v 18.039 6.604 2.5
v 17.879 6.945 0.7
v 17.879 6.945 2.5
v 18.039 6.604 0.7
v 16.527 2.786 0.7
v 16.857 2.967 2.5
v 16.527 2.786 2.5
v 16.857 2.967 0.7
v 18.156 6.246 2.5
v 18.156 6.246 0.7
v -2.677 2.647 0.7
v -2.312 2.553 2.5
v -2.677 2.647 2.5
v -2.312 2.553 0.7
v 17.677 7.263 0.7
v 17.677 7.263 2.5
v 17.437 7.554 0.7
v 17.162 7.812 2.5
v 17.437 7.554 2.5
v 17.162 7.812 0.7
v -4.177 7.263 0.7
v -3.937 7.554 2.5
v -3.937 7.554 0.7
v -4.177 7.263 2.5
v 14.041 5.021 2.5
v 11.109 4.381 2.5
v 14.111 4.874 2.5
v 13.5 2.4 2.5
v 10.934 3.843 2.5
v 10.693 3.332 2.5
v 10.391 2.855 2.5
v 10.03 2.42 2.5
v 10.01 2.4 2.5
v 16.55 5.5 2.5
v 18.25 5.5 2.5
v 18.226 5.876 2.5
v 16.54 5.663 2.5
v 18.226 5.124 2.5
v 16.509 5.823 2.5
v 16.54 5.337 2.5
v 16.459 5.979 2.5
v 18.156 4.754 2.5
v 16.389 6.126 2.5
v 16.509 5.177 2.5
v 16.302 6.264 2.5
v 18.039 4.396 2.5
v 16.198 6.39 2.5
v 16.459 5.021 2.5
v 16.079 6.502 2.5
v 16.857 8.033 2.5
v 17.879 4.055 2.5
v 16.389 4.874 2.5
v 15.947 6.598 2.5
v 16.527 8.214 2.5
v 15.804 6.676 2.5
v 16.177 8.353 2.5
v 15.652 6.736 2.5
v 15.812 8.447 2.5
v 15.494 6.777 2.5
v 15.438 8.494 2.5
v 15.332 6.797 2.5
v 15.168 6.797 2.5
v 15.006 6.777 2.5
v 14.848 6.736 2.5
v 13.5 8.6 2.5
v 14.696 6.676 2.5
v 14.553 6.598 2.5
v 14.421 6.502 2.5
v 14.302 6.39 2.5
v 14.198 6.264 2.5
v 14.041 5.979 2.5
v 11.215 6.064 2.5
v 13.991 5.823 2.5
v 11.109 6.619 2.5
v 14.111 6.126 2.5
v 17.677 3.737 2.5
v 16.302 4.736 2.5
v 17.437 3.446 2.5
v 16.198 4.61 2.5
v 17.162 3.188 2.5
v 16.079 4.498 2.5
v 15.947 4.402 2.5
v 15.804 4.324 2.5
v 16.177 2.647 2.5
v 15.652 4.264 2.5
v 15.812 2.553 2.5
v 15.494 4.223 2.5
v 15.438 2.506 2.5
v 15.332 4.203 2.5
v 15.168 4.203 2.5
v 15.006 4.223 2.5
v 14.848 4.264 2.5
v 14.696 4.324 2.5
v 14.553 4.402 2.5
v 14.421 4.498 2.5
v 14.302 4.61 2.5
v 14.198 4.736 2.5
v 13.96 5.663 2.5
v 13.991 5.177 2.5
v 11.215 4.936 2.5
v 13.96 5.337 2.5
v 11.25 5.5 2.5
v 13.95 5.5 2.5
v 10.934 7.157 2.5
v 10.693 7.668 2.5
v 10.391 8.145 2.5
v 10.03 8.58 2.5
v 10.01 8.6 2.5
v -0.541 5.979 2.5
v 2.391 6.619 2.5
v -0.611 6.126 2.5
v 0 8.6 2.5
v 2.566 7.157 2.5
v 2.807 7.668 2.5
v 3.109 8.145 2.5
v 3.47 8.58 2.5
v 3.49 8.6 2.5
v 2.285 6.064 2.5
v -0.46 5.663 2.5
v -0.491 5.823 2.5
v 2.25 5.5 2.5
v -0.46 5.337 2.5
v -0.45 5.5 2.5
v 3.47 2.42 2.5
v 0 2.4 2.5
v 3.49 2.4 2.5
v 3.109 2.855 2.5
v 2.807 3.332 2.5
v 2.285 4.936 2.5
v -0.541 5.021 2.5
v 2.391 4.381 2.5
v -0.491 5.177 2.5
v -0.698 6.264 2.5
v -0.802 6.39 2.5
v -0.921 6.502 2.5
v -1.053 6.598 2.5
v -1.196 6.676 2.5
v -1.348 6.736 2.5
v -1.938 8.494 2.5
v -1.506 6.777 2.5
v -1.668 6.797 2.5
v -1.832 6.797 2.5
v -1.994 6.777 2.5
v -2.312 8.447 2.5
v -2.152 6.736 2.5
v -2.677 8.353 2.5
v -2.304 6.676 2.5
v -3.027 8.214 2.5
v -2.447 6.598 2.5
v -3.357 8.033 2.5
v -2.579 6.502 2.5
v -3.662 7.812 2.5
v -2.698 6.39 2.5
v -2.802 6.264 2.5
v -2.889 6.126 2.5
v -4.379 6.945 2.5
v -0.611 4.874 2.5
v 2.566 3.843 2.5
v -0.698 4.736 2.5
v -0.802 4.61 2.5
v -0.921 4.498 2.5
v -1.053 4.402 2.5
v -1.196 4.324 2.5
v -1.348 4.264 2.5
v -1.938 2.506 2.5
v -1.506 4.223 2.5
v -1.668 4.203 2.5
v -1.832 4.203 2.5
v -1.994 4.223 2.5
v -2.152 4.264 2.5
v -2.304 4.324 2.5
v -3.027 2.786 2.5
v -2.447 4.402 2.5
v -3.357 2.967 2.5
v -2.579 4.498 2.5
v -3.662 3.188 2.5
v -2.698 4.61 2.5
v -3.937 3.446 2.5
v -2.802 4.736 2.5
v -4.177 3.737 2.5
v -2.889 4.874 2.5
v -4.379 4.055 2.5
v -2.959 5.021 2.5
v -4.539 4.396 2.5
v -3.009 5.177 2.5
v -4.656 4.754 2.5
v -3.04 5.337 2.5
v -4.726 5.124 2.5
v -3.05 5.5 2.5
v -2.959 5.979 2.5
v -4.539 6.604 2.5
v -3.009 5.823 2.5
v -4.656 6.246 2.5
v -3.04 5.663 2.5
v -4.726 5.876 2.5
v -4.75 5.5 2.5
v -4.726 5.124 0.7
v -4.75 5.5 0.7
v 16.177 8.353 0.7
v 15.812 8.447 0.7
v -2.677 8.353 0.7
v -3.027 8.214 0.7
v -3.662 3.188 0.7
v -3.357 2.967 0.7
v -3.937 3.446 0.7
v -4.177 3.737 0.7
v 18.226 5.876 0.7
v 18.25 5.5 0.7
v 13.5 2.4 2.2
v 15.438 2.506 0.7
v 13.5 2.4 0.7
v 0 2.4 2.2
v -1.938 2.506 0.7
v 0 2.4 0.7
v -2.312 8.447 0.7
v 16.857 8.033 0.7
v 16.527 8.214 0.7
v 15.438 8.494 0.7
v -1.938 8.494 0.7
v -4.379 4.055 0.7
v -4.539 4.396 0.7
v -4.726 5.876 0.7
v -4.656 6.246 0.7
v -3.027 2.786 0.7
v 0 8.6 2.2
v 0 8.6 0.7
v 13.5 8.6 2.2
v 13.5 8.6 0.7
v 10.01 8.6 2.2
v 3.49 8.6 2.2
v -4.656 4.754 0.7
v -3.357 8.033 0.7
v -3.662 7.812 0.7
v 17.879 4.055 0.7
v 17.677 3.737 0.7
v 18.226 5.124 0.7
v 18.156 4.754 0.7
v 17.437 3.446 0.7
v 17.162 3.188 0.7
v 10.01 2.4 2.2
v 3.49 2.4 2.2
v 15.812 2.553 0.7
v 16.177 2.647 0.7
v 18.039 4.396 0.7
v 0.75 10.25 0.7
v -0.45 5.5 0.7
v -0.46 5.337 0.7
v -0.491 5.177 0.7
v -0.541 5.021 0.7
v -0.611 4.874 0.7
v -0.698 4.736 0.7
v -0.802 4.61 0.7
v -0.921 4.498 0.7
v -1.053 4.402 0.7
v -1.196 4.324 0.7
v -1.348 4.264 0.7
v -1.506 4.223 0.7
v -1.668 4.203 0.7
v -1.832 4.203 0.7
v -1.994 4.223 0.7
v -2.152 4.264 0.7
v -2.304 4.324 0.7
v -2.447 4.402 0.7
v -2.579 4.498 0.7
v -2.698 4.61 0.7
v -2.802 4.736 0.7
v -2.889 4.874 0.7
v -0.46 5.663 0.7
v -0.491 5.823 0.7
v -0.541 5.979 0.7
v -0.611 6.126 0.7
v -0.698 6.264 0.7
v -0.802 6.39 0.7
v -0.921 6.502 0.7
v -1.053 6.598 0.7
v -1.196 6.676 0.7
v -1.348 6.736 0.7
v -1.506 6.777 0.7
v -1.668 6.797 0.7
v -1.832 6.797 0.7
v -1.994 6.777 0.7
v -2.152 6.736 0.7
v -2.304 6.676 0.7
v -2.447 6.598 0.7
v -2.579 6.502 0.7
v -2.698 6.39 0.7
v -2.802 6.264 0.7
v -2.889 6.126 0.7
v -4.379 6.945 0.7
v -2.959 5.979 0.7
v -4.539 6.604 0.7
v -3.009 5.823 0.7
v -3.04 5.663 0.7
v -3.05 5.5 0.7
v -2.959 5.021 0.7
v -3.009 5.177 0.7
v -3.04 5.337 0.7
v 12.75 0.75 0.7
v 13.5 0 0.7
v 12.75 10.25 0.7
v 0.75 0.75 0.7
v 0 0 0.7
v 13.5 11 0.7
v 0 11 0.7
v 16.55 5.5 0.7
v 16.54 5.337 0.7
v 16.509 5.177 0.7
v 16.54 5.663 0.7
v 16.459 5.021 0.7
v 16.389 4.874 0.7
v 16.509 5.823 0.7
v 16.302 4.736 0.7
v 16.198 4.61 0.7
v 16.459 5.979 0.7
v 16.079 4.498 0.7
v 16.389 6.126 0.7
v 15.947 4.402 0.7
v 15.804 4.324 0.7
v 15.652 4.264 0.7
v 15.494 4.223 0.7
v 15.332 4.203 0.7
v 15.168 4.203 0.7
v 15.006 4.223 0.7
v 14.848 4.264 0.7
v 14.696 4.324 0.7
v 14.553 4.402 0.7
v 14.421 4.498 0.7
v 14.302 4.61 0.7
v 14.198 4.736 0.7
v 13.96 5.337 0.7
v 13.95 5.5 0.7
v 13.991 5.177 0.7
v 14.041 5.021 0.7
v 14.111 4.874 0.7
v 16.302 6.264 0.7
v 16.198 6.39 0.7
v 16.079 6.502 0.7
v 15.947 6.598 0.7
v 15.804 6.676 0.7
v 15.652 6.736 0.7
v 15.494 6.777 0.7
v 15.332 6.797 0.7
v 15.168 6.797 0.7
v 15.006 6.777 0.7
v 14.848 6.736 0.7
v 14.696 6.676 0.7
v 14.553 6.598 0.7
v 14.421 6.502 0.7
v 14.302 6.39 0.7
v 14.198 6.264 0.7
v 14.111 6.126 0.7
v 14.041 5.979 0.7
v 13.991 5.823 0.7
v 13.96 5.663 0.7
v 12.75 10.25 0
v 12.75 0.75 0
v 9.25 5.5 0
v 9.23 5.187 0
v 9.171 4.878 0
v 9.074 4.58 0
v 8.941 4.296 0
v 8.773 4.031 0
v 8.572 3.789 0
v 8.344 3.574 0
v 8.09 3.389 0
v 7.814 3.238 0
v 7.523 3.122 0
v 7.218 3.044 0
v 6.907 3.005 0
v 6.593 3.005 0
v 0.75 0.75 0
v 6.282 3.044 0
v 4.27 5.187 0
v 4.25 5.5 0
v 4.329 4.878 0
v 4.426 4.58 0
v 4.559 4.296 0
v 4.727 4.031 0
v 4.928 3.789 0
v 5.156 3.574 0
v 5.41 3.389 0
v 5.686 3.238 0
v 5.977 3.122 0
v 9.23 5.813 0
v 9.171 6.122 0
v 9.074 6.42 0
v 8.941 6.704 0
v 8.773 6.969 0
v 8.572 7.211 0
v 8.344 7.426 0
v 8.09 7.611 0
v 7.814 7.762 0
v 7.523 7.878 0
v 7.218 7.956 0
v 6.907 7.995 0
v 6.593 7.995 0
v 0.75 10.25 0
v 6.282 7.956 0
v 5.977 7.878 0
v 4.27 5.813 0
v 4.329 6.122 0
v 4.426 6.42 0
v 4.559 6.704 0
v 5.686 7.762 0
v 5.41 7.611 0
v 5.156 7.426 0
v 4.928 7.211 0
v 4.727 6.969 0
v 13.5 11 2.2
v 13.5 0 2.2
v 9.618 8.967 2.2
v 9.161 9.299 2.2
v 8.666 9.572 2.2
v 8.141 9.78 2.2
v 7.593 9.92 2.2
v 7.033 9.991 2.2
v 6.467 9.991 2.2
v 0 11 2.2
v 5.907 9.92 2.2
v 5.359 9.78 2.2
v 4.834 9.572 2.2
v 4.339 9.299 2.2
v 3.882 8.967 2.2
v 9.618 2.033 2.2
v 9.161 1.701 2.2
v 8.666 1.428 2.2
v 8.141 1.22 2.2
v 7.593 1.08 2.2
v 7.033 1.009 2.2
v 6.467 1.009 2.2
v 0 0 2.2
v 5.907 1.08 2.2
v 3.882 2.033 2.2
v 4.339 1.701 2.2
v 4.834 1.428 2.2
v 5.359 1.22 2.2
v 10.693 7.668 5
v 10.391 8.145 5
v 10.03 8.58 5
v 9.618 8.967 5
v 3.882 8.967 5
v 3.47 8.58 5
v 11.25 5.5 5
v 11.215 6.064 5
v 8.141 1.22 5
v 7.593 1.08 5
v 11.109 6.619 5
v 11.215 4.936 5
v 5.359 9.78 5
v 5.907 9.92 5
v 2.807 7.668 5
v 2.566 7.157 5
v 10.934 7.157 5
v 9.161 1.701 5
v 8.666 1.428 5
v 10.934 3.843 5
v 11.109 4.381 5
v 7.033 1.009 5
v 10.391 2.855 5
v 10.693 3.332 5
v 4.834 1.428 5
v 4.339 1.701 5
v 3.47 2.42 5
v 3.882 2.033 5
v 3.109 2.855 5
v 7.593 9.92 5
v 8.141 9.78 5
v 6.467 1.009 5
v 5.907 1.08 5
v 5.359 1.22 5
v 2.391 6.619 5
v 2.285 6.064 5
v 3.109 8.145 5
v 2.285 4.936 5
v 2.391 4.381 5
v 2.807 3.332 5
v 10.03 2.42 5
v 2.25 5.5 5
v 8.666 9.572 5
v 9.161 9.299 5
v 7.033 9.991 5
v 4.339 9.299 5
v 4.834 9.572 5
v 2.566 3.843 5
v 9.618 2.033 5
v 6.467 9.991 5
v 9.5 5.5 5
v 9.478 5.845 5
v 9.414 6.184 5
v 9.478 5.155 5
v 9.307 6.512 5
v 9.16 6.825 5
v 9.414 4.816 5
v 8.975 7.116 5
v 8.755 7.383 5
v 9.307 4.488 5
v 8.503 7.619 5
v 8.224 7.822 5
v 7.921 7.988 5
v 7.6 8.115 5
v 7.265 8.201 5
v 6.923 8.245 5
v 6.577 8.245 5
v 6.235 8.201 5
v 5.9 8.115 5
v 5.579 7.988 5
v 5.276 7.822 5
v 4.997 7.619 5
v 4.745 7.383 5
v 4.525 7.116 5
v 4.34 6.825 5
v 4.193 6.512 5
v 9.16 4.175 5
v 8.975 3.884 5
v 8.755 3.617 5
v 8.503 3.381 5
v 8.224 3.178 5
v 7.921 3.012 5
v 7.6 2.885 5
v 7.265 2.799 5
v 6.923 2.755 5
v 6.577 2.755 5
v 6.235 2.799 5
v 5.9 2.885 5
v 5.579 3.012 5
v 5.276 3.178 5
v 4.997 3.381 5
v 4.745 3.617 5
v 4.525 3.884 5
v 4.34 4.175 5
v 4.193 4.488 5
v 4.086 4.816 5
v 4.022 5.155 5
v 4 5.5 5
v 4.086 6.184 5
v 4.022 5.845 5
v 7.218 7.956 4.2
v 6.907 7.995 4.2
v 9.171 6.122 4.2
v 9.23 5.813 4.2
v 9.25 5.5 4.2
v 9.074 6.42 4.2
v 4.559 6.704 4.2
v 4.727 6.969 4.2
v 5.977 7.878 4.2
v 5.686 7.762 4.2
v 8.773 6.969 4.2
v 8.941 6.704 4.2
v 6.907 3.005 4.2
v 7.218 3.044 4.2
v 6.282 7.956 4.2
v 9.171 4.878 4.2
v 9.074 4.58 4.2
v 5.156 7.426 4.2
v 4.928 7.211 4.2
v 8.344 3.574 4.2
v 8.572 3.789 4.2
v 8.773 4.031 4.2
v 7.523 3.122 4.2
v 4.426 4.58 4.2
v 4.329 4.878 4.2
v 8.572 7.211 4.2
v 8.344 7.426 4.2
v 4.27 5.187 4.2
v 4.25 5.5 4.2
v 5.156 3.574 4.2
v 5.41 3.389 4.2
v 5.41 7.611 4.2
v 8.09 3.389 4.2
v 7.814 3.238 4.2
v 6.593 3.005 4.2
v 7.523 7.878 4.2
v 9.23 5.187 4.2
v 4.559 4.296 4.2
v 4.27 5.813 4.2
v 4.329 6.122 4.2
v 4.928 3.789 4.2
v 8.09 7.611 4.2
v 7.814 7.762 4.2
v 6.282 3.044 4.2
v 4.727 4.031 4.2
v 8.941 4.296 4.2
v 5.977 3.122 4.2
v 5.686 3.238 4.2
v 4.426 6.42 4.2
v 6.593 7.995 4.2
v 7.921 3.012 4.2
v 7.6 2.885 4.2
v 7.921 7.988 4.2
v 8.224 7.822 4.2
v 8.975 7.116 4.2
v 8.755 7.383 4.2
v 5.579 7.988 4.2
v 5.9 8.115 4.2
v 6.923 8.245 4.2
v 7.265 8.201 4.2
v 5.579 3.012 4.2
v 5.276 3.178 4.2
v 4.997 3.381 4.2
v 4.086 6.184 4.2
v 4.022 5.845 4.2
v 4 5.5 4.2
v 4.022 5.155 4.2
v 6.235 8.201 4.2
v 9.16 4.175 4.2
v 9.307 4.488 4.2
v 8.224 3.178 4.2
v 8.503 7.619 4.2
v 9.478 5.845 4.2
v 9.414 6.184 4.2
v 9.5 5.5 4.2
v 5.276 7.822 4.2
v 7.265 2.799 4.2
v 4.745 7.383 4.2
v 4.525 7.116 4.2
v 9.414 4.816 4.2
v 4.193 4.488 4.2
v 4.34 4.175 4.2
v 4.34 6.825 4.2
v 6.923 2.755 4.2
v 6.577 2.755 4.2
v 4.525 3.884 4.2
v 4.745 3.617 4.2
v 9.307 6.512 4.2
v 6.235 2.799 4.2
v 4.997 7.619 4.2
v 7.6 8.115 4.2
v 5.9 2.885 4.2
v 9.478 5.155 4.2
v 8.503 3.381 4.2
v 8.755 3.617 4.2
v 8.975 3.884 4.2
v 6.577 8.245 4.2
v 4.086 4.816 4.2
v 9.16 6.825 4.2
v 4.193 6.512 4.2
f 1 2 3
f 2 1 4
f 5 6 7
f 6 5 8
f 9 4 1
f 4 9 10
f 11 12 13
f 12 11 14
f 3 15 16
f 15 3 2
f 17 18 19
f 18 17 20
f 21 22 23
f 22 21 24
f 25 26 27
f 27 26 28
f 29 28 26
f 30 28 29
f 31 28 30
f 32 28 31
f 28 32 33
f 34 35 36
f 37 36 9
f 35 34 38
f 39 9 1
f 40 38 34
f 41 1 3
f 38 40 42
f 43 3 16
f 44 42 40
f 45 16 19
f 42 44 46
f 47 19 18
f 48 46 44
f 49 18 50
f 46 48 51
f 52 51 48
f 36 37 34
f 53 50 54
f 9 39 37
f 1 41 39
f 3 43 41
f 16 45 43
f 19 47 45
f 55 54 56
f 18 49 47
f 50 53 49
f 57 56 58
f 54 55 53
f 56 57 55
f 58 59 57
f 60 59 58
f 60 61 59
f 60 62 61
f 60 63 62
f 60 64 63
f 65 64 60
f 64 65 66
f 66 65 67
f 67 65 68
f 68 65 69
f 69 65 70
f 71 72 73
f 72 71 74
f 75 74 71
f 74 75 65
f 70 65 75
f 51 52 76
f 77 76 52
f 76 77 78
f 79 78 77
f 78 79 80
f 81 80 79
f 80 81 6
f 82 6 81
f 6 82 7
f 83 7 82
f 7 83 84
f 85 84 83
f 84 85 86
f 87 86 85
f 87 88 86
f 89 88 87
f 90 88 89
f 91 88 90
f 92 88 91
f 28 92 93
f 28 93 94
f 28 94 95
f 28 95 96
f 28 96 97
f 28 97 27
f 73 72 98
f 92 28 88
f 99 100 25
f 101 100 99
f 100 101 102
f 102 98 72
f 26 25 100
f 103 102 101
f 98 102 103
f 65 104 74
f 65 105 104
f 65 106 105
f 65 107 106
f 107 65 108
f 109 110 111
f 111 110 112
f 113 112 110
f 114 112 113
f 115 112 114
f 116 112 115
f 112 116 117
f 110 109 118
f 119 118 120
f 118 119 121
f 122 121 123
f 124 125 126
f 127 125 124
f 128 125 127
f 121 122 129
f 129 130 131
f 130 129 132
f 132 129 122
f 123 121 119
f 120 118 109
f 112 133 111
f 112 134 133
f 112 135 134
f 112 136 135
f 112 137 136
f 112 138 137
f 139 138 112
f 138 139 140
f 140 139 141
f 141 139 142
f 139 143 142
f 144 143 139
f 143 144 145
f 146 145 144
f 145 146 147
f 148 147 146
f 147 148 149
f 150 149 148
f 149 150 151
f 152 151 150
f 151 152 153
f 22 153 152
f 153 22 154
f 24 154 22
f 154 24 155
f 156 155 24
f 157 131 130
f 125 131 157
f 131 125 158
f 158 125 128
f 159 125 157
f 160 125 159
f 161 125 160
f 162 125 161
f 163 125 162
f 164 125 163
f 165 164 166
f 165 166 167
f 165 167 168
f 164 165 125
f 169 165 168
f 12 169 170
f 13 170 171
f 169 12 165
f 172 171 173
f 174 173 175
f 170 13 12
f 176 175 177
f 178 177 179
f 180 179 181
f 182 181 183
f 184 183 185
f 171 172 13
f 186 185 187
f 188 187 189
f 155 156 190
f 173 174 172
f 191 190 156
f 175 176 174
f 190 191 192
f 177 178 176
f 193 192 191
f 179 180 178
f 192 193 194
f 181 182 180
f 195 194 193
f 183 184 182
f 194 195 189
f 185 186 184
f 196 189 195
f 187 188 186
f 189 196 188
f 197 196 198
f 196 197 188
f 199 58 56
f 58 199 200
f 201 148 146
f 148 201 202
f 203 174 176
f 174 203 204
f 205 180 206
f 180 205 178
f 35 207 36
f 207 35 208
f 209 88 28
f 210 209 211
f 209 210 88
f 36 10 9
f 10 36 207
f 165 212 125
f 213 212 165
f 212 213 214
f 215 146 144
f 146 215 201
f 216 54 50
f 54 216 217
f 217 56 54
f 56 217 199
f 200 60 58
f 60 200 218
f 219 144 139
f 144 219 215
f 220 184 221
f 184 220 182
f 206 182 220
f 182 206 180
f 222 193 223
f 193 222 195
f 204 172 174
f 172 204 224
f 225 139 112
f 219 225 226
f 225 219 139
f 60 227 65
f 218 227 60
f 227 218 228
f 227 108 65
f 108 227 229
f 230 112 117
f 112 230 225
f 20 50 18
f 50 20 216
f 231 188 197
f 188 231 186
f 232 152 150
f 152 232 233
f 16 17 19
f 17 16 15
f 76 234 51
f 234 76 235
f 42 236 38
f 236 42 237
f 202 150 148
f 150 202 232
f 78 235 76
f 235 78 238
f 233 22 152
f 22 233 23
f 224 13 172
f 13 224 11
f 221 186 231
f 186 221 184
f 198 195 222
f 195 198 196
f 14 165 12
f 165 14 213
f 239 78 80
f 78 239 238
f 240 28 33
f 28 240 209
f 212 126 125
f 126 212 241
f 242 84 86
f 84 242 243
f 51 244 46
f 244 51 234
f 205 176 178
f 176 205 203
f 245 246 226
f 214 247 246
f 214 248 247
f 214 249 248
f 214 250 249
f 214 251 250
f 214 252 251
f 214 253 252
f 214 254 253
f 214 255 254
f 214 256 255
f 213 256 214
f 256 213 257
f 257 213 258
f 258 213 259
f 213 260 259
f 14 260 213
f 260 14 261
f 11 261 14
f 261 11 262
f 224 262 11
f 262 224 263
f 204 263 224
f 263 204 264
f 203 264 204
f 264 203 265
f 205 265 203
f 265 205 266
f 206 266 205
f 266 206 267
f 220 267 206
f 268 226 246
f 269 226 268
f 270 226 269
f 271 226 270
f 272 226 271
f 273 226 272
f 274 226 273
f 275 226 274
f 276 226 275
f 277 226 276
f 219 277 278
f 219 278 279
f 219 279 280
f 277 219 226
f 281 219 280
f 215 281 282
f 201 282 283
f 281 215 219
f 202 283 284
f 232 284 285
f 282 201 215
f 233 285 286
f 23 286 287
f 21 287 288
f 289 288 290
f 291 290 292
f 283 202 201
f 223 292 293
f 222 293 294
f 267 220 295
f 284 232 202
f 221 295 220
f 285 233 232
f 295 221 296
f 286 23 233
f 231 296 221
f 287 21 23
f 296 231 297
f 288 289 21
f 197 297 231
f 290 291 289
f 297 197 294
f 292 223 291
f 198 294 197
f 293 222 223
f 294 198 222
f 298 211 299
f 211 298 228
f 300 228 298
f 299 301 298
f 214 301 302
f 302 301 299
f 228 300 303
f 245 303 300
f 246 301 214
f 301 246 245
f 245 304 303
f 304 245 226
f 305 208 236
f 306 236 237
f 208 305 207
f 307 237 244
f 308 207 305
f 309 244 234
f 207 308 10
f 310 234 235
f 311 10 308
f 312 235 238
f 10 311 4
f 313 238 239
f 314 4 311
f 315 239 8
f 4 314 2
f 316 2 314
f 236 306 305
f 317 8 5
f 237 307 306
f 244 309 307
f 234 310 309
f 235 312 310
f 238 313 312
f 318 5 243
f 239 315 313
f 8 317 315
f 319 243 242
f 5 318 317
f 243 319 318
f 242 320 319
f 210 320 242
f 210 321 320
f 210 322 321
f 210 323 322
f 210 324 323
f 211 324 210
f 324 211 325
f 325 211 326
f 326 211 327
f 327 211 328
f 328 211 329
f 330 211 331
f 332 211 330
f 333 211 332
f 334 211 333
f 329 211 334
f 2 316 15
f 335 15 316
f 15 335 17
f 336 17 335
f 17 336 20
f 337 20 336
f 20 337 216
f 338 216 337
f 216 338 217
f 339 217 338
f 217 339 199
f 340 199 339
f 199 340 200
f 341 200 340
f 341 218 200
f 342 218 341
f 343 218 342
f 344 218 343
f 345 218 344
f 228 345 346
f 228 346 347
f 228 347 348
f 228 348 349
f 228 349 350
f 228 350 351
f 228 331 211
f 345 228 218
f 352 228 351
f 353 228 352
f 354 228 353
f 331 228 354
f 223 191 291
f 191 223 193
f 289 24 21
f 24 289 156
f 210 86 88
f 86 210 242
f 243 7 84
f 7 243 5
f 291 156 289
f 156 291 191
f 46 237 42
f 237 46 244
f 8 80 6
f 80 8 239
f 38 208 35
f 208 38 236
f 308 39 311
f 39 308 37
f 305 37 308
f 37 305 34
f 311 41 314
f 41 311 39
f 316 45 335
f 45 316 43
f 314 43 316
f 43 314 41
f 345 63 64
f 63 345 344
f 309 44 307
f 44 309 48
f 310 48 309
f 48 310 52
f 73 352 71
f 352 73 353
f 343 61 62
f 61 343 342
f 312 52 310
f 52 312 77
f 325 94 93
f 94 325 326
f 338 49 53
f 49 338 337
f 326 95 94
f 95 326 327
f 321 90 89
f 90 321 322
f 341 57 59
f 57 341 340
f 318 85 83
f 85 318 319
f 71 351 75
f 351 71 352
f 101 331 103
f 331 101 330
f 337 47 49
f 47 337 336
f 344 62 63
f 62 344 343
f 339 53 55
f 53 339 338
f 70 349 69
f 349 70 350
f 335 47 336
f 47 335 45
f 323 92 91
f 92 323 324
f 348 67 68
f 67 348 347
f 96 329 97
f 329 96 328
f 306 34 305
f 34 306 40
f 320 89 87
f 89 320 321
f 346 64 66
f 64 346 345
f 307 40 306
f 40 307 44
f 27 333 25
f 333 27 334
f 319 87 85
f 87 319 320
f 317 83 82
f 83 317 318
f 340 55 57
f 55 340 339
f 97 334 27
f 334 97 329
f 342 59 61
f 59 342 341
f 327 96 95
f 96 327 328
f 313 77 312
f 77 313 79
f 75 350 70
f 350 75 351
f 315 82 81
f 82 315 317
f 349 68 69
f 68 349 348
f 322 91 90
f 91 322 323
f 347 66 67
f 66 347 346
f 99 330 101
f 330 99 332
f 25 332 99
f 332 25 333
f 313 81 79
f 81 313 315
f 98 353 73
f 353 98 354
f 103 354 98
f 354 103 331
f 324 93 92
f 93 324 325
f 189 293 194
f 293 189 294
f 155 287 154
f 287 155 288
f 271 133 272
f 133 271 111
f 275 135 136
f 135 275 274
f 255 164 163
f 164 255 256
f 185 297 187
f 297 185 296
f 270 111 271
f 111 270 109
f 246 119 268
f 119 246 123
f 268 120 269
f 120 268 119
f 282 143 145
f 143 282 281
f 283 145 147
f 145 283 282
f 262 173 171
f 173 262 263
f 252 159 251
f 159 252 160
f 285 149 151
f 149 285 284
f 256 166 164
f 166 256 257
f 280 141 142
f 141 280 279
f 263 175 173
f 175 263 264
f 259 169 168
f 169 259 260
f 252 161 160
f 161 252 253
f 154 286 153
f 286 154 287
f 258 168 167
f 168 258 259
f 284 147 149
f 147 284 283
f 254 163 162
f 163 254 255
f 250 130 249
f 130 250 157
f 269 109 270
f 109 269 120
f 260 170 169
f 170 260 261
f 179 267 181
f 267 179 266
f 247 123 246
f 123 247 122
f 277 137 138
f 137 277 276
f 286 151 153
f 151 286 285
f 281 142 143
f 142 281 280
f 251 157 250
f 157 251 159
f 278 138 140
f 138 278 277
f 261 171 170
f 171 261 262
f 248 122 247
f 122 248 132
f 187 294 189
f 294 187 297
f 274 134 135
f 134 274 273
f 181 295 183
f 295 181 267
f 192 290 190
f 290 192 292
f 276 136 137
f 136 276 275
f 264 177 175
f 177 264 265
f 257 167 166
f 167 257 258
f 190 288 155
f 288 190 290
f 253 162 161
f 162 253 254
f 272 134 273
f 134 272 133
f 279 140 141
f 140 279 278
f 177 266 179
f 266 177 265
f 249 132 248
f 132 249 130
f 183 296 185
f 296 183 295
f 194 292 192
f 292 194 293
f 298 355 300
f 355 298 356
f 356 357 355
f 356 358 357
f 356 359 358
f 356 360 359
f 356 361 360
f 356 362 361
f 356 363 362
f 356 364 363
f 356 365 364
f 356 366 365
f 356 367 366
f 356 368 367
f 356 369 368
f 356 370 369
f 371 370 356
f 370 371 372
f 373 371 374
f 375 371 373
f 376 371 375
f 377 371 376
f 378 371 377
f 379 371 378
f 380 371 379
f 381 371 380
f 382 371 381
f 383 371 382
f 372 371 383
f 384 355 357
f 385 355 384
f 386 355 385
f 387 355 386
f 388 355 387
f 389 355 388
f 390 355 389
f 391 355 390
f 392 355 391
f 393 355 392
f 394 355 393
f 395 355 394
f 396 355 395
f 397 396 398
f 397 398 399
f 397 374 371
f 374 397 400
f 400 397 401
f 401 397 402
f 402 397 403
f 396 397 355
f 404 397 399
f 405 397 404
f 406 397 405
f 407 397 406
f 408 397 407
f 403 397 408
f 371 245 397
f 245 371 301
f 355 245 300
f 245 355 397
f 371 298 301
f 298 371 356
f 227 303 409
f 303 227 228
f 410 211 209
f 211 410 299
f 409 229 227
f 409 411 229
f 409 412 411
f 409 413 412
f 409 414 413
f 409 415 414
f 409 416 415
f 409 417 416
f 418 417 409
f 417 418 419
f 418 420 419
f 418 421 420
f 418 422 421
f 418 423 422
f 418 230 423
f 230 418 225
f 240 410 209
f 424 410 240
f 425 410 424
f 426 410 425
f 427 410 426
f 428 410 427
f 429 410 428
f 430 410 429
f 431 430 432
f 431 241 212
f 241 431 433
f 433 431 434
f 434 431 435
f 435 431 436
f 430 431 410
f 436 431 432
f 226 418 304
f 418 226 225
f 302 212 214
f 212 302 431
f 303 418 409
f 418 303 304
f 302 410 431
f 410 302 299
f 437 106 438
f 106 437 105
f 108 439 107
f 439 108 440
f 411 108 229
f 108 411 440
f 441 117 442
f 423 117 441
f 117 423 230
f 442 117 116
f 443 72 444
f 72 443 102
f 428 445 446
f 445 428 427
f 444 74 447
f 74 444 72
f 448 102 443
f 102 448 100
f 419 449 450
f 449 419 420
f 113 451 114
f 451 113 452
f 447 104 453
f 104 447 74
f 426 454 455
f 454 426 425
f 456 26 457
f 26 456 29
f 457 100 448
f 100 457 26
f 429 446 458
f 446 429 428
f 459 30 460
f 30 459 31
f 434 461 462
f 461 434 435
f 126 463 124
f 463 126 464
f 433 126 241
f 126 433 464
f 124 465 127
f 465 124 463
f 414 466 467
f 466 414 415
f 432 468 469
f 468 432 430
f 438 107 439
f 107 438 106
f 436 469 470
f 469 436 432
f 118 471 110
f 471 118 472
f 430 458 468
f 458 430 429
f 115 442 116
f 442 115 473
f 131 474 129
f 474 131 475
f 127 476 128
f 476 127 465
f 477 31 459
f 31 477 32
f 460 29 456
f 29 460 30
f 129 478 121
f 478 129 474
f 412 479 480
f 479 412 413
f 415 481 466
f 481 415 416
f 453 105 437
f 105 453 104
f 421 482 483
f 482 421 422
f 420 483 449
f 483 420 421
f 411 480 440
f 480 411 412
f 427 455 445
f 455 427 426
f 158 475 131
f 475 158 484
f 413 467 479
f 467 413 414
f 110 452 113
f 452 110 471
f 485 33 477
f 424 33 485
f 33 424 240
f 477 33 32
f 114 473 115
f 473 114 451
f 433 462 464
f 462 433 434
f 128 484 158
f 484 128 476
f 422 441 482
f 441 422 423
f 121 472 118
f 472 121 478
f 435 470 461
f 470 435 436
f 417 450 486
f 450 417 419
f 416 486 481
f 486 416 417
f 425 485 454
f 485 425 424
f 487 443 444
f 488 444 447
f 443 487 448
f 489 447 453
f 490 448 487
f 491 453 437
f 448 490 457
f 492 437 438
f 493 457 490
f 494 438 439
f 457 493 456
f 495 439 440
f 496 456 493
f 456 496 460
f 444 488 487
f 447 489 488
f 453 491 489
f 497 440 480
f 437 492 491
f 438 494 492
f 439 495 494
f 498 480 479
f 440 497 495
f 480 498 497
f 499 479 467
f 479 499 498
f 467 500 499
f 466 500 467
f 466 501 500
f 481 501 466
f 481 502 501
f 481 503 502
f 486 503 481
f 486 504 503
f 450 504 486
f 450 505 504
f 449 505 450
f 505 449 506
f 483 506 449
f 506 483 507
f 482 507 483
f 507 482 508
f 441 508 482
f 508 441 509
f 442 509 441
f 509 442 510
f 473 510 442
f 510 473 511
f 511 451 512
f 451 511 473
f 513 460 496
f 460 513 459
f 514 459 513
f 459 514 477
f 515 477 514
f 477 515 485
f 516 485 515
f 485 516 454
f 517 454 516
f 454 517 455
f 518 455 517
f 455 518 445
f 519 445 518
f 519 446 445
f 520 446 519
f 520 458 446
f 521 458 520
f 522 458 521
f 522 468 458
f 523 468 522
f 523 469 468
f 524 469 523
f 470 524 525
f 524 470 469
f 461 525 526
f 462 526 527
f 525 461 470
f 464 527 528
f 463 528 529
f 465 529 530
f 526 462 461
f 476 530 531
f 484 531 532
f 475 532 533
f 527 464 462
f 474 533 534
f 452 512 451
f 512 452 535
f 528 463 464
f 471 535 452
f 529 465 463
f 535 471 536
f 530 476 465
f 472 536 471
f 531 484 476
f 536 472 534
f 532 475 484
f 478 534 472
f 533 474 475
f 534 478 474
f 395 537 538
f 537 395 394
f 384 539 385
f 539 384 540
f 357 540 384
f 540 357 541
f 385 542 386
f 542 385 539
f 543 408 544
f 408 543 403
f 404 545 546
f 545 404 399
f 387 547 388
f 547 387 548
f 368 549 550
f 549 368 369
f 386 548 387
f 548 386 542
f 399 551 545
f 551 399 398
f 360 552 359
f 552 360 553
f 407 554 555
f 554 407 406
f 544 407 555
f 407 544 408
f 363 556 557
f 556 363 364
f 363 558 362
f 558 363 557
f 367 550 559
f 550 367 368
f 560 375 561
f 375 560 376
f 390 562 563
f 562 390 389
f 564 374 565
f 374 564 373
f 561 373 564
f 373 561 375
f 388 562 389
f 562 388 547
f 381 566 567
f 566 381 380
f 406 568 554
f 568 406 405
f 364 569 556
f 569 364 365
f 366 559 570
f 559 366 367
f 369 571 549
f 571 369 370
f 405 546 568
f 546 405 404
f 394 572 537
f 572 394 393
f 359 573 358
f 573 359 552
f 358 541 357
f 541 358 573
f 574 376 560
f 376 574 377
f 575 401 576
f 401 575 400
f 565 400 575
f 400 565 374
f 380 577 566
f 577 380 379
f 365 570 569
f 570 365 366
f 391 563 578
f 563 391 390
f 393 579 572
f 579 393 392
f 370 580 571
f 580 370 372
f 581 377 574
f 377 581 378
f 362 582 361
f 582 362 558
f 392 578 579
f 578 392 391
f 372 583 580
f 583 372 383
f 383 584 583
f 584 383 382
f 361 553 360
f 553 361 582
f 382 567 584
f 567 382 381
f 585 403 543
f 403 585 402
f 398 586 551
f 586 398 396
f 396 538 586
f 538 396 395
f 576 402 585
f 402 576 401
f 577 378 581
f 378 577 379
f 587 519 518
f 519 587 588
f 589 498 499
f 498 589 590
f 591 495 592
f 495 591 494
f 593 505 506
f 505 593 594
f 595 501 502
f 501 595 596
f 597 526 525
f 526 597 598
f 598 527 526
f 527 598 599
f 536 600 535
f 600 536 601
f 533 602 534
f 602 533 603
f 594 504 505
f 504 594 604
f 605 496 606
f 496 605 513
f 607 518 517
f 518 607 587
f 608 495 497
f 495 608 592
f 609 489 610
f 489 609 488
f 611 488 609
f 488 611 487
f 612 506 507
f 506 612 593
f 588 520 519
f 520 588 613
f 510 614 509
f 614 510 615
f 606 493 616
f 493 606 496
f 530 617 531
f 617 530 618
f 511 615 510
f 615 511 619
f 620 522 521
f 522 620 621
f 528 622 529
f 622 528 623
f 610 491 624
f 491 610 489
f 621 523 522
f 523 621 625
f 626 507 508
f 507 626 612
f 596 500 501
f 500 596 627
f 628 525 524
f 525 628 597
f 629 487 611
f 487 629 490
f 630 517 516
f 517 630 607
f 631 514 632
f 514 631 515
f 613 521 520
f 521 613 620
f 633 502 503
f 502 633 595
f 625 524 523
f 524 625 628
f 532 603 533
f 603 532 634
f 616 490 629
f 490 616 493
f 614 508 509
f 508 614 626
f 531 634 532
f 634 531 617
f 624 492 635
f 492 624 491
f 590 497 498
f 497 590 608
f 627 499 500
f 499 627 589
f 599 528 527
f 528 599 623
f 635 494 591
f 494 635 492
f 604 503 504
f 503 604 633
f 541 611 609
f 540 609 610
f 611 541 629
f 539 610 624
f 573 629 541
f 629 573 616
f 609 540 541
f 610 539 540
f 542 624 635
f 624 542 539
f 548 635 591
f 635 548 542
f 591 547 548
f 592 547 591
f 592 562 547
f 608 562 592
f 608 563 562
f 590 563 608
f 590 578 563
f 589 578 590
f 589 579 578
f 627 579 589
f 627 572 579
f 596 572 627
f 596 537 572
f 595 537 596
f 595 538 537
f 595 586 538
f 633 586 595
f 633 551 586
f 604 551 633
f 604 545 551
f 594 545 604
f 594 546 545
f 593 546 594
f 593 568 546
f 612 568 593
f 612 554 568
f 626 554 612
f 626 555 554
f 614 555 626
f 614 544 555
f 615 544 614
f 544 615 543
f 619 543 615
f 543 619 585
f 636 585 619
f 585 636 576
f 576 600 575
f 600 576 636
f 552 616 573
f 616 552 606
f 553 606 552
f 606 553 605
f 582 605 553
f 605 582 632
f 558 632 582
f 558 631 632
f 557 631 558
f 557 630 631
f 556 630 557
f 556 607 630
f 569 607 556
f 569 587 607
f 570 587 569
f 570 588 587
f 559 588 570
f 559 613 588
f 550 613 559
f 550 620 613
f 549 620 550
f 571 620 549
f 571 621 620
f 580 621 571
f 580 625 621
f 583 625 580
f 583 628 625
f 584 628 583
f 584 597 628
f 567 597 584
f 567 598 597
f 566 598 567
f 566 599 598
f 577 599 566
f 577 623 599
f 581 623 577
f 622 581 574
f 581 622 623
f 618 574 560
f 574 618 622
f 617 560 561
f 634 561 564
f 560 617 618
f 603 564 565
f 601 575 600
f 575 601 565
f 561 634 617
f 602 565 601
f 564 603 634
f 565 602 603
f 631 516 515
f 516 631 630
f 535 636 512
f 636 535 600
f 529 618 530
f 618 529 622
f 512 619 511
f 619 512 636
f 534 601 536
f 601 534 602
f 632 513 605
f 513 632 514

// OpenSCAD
module rocklight()
{
    difference()
    {
        union()
        {
            color("Green") translate([0.75, 0.75, 0]) cube([12, 9.5, 0.7]);
            translate([0, 0, 0.7]) cube([13.5, 11, 1.5]);
            difference()
            {
                color("red") hull()
                {
                    translate([0, 2.4, 0.7]) cube([13.5, 6.2, 1.8]);
                    translate([13.5+1.75, 5.5, 0.7]) cylinder(d=6, h=1.8);
                    translate([-1.75, 5.5, 0.7]) cylinder(d=6, h=1.8);
                }
                translate([13.5+1.75, 5.5, 0.7]) cylinder(d=2.6, h=1.8);
                translate([-1.75, 5.5, 0.7]) cylinder(d=2.6, h=1.8);
            }
            color("blue") translate([13.5/2, 11/2, 0]) cylinder(d=9, h=5);
        }
        //LED Loch
        translate([13.5/2, 11/2, 0]) cylinder(d=5, h=5);
        translate([13.5/2, 11/2, 4.2]) cylinder(d=5.5, h=0.8);
    }
}

$fn=50;
rocklight();
